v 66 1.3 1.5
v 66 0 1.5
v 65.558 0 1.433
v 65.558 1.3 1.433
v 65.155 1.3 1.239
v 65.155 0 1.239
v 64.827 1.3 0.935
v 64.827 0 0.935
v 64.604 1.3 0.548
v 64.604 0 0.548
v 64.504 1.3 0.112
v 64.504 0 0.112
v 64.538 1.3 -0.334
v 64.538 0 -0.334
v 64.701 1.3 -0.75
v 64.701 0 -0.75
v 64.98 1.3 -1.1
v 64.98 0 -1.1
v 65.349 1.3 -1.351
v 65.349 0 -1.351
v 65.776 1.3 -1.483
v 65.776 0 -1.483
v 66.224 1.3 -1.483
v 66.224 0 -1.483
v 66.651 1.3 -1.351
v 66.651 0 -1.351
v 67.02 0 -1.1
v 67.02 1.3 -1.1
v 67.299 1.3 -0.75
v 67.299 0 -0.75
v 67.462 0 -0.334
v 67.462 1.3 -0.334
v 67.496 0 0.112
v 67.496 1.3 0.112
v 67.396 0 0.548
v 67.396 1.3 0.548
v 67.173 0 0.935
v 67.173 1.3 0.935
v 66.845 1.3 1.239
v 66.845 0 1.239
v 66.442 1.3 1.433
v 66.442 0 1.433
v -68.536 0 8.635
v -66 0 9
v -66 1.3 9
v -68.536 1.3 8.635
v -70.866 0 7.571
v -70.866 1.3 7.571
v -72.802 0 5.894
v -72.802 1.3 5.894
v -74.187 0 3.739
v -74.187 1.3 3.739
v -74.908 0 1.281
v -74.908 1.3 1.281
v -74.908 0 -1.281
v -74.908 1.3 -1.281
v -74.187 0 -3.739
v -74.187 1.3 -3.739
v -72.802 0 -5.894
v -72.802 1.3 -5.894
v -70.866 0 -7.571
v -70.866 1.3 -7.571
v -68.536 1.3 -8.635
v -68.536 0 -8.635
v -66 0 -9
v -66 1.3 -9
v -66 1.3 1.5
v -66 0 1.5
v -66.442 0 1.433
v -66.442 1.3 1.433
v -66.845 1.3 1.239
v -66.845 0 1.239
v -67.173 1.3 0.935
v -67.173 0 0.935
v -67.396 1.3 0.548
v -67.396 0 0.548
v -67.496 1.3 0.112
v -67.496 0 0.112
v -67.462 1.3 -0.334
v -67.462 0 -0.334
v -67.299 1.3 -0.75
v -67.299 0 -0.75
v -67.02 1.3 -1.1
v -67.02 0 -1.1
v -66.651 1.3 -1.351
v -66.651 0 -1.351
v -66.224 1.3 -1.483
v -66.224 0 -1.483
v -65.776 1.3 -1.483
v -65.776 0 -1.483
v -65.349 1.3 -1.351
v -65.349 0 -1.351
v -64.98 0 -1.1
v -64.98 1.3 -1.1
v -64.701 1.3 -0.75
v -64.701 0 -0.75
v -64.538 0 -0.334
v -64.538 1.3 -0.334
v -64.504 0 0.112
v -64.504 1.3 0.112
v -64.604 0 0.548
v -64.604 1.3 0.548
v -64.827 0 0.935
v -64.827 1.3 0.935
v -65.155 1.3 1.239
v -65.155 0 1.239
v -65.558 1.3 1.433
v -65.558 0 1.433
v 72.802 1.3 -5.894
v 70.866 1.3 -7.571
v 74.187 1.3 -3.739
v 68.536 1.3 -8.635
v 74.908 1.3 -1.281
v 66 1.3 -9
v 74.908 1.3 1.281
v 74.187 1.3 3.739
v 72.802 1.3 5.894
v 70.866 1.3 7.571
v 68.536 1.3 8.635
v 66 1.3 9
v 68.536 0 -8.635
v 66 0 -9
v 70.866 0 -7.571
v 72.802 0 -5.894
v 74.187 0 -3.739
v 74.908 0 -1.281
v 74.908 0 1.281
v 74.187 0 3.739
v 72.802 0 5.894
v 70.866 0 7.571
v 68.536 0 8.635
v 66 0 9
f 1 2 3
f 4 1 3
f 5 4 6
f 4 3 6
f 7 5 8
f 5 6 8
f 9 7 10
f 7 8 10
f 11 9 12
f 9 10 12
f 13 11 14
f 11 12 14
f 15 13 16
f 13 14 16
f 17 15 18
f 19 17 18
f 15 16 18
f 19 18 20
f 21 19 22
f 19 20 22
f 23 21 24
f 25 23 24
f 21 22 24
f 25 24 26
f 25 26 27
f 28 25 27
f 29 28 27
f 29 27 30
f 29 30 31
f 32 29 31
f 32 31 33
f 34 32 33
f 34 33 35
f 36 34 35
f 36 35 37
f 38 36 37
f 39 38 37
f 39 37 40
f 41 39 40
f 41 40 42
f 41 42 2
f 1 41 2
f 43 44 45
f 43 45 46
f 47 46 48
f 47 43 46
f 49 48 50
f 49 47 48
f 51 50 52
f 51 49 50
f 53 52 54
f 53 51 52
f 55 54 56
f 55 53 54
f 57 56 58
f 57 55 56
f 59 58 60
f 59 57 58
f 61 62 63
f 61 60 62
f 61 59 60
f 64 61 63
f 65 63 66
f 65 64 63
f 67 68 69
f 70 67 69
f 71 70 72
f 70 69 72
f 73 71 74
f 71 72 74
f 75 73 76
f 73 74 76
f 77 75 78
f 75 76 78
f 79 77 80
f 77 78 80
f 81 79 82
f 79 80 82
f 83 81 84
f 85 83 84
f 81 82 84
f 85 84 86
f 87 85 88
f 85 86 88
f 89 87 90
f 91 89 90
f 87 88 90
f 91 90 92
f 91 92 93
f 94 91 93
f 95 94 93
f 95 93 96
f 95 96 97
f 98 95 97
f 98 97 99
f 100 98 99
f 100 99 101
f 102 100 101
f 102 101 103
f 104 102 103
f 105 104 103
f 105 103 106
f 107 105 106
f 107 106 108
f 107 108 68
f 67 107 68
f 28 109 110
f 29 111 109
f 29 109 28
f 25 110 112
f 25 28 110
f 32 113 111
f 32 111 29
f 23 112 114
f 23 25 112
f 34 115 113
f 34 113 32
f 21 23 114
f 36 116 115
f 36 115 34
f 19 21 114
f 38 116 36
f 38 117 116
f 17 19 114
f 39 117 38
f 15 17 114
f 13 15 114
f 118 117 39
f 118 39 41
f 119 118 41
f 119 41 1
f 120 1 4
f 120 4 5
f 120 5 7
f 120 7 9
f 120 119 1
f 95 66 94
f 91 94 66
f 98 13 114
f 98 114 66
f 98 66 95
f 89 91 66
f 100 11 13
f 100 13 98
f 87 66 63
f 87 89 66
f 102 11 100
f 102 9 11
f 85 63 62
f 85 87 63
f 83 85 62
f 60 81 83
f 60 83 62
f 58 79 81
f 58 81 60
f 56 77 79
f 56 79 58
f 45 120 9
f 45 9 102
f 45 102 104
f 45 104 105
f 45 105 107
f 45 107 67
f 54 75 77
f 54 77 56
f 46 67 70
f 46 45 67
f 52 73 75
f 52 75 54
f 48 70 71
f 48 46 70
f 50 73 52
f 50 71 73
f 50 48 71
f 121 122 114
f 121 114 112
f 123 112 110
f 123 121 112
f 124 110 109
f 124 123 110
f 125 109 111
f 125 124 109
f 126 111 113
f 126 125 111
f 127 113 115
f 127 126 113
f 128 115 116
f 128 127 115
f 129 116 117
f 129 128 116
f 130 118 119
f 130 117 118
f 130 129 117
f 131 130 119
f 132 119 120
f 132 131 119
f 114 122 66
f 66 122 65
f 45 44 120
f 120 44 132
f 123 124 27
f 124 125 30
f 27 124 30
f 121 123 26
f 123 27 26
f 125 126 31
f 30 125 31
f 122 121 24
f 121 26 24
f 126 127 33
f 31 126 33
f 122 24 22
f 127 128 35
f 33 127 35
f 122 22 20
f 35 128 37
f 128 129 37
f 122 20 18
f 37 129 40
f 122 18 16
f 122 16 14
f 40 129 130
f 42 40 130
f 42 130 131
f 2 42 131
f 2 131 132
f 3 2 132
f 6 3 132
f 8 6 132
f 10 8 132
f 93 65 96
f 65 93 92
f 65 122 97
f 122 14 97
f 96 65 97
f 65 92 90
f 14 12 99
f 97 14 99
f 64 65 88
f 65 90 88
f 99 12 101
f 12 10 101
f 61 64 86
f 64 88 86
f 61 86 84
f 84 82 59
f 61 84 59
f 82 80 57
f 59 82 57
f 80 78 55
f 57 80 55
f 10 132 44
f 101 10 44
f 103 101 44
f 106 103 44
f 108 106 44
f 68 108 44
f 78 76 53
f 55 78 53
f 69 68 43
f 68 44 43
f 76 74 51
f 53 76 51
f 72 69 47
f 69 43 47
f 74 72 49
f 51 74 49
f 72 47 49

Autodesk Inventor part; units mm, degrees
ref_plane "YZ Plane" through (0, 0, 0) normal (1, 0, 0) x (0, 1, 0)
ref_plane "XZ Plane" through (0, 0, 0) normal (0, 1, 0) x (-1, 0, 0)
ref_plane "XY Plane" through (0, 0, 0) normal (0, 0, 1) x (1, 0, 0)
sketch "Sketch1" plane through (0, 0, 0) normal (0, 1, 0) x (-1, 0, 0)
  line L0 (66, 0) -> (-66, 0) construction
  line L1 (66, 9) -> (-66, 9)
  line L2 (-66, -9) -> (66, -9)
  arc A0 (66, -9) -> (66, 9) centre (66, 0) ccw
  arc A1 (-66, 9) -> (-66, -9) centre (-66, 0) ccw
  point P0 (0, 0)
  dimension "d0" = 66
  dimension "d1" = 18
extrude "Extrusion1" add sketch "Sketch1" along normal blind 1.3
sketch "Sketch2" plane through (0, 1.3, 0) normal (0, 1, 0) x (1, 0, 0)
  arc A0 (-66, 9) -> (-66, -9) centre (-66, 0) ccw projected
  arc A1 (66, -9) -> (66, 9) centre (66, 0) ccw projected
  point P0 (0, 0)
hole "Hole1" at (-66, 1.3, 0) at (66, 1.3, 0) direction (0, -1, 0) diameter 3 end through all
thread "Thread1" size "M3x0.5" class "6H" standard "ANSI Metric M Profile" full length
thread "Thread2" size "M3x0.5" class "6H" standard "ANSI Metric M Profile" full length
properties part number "upper link"
